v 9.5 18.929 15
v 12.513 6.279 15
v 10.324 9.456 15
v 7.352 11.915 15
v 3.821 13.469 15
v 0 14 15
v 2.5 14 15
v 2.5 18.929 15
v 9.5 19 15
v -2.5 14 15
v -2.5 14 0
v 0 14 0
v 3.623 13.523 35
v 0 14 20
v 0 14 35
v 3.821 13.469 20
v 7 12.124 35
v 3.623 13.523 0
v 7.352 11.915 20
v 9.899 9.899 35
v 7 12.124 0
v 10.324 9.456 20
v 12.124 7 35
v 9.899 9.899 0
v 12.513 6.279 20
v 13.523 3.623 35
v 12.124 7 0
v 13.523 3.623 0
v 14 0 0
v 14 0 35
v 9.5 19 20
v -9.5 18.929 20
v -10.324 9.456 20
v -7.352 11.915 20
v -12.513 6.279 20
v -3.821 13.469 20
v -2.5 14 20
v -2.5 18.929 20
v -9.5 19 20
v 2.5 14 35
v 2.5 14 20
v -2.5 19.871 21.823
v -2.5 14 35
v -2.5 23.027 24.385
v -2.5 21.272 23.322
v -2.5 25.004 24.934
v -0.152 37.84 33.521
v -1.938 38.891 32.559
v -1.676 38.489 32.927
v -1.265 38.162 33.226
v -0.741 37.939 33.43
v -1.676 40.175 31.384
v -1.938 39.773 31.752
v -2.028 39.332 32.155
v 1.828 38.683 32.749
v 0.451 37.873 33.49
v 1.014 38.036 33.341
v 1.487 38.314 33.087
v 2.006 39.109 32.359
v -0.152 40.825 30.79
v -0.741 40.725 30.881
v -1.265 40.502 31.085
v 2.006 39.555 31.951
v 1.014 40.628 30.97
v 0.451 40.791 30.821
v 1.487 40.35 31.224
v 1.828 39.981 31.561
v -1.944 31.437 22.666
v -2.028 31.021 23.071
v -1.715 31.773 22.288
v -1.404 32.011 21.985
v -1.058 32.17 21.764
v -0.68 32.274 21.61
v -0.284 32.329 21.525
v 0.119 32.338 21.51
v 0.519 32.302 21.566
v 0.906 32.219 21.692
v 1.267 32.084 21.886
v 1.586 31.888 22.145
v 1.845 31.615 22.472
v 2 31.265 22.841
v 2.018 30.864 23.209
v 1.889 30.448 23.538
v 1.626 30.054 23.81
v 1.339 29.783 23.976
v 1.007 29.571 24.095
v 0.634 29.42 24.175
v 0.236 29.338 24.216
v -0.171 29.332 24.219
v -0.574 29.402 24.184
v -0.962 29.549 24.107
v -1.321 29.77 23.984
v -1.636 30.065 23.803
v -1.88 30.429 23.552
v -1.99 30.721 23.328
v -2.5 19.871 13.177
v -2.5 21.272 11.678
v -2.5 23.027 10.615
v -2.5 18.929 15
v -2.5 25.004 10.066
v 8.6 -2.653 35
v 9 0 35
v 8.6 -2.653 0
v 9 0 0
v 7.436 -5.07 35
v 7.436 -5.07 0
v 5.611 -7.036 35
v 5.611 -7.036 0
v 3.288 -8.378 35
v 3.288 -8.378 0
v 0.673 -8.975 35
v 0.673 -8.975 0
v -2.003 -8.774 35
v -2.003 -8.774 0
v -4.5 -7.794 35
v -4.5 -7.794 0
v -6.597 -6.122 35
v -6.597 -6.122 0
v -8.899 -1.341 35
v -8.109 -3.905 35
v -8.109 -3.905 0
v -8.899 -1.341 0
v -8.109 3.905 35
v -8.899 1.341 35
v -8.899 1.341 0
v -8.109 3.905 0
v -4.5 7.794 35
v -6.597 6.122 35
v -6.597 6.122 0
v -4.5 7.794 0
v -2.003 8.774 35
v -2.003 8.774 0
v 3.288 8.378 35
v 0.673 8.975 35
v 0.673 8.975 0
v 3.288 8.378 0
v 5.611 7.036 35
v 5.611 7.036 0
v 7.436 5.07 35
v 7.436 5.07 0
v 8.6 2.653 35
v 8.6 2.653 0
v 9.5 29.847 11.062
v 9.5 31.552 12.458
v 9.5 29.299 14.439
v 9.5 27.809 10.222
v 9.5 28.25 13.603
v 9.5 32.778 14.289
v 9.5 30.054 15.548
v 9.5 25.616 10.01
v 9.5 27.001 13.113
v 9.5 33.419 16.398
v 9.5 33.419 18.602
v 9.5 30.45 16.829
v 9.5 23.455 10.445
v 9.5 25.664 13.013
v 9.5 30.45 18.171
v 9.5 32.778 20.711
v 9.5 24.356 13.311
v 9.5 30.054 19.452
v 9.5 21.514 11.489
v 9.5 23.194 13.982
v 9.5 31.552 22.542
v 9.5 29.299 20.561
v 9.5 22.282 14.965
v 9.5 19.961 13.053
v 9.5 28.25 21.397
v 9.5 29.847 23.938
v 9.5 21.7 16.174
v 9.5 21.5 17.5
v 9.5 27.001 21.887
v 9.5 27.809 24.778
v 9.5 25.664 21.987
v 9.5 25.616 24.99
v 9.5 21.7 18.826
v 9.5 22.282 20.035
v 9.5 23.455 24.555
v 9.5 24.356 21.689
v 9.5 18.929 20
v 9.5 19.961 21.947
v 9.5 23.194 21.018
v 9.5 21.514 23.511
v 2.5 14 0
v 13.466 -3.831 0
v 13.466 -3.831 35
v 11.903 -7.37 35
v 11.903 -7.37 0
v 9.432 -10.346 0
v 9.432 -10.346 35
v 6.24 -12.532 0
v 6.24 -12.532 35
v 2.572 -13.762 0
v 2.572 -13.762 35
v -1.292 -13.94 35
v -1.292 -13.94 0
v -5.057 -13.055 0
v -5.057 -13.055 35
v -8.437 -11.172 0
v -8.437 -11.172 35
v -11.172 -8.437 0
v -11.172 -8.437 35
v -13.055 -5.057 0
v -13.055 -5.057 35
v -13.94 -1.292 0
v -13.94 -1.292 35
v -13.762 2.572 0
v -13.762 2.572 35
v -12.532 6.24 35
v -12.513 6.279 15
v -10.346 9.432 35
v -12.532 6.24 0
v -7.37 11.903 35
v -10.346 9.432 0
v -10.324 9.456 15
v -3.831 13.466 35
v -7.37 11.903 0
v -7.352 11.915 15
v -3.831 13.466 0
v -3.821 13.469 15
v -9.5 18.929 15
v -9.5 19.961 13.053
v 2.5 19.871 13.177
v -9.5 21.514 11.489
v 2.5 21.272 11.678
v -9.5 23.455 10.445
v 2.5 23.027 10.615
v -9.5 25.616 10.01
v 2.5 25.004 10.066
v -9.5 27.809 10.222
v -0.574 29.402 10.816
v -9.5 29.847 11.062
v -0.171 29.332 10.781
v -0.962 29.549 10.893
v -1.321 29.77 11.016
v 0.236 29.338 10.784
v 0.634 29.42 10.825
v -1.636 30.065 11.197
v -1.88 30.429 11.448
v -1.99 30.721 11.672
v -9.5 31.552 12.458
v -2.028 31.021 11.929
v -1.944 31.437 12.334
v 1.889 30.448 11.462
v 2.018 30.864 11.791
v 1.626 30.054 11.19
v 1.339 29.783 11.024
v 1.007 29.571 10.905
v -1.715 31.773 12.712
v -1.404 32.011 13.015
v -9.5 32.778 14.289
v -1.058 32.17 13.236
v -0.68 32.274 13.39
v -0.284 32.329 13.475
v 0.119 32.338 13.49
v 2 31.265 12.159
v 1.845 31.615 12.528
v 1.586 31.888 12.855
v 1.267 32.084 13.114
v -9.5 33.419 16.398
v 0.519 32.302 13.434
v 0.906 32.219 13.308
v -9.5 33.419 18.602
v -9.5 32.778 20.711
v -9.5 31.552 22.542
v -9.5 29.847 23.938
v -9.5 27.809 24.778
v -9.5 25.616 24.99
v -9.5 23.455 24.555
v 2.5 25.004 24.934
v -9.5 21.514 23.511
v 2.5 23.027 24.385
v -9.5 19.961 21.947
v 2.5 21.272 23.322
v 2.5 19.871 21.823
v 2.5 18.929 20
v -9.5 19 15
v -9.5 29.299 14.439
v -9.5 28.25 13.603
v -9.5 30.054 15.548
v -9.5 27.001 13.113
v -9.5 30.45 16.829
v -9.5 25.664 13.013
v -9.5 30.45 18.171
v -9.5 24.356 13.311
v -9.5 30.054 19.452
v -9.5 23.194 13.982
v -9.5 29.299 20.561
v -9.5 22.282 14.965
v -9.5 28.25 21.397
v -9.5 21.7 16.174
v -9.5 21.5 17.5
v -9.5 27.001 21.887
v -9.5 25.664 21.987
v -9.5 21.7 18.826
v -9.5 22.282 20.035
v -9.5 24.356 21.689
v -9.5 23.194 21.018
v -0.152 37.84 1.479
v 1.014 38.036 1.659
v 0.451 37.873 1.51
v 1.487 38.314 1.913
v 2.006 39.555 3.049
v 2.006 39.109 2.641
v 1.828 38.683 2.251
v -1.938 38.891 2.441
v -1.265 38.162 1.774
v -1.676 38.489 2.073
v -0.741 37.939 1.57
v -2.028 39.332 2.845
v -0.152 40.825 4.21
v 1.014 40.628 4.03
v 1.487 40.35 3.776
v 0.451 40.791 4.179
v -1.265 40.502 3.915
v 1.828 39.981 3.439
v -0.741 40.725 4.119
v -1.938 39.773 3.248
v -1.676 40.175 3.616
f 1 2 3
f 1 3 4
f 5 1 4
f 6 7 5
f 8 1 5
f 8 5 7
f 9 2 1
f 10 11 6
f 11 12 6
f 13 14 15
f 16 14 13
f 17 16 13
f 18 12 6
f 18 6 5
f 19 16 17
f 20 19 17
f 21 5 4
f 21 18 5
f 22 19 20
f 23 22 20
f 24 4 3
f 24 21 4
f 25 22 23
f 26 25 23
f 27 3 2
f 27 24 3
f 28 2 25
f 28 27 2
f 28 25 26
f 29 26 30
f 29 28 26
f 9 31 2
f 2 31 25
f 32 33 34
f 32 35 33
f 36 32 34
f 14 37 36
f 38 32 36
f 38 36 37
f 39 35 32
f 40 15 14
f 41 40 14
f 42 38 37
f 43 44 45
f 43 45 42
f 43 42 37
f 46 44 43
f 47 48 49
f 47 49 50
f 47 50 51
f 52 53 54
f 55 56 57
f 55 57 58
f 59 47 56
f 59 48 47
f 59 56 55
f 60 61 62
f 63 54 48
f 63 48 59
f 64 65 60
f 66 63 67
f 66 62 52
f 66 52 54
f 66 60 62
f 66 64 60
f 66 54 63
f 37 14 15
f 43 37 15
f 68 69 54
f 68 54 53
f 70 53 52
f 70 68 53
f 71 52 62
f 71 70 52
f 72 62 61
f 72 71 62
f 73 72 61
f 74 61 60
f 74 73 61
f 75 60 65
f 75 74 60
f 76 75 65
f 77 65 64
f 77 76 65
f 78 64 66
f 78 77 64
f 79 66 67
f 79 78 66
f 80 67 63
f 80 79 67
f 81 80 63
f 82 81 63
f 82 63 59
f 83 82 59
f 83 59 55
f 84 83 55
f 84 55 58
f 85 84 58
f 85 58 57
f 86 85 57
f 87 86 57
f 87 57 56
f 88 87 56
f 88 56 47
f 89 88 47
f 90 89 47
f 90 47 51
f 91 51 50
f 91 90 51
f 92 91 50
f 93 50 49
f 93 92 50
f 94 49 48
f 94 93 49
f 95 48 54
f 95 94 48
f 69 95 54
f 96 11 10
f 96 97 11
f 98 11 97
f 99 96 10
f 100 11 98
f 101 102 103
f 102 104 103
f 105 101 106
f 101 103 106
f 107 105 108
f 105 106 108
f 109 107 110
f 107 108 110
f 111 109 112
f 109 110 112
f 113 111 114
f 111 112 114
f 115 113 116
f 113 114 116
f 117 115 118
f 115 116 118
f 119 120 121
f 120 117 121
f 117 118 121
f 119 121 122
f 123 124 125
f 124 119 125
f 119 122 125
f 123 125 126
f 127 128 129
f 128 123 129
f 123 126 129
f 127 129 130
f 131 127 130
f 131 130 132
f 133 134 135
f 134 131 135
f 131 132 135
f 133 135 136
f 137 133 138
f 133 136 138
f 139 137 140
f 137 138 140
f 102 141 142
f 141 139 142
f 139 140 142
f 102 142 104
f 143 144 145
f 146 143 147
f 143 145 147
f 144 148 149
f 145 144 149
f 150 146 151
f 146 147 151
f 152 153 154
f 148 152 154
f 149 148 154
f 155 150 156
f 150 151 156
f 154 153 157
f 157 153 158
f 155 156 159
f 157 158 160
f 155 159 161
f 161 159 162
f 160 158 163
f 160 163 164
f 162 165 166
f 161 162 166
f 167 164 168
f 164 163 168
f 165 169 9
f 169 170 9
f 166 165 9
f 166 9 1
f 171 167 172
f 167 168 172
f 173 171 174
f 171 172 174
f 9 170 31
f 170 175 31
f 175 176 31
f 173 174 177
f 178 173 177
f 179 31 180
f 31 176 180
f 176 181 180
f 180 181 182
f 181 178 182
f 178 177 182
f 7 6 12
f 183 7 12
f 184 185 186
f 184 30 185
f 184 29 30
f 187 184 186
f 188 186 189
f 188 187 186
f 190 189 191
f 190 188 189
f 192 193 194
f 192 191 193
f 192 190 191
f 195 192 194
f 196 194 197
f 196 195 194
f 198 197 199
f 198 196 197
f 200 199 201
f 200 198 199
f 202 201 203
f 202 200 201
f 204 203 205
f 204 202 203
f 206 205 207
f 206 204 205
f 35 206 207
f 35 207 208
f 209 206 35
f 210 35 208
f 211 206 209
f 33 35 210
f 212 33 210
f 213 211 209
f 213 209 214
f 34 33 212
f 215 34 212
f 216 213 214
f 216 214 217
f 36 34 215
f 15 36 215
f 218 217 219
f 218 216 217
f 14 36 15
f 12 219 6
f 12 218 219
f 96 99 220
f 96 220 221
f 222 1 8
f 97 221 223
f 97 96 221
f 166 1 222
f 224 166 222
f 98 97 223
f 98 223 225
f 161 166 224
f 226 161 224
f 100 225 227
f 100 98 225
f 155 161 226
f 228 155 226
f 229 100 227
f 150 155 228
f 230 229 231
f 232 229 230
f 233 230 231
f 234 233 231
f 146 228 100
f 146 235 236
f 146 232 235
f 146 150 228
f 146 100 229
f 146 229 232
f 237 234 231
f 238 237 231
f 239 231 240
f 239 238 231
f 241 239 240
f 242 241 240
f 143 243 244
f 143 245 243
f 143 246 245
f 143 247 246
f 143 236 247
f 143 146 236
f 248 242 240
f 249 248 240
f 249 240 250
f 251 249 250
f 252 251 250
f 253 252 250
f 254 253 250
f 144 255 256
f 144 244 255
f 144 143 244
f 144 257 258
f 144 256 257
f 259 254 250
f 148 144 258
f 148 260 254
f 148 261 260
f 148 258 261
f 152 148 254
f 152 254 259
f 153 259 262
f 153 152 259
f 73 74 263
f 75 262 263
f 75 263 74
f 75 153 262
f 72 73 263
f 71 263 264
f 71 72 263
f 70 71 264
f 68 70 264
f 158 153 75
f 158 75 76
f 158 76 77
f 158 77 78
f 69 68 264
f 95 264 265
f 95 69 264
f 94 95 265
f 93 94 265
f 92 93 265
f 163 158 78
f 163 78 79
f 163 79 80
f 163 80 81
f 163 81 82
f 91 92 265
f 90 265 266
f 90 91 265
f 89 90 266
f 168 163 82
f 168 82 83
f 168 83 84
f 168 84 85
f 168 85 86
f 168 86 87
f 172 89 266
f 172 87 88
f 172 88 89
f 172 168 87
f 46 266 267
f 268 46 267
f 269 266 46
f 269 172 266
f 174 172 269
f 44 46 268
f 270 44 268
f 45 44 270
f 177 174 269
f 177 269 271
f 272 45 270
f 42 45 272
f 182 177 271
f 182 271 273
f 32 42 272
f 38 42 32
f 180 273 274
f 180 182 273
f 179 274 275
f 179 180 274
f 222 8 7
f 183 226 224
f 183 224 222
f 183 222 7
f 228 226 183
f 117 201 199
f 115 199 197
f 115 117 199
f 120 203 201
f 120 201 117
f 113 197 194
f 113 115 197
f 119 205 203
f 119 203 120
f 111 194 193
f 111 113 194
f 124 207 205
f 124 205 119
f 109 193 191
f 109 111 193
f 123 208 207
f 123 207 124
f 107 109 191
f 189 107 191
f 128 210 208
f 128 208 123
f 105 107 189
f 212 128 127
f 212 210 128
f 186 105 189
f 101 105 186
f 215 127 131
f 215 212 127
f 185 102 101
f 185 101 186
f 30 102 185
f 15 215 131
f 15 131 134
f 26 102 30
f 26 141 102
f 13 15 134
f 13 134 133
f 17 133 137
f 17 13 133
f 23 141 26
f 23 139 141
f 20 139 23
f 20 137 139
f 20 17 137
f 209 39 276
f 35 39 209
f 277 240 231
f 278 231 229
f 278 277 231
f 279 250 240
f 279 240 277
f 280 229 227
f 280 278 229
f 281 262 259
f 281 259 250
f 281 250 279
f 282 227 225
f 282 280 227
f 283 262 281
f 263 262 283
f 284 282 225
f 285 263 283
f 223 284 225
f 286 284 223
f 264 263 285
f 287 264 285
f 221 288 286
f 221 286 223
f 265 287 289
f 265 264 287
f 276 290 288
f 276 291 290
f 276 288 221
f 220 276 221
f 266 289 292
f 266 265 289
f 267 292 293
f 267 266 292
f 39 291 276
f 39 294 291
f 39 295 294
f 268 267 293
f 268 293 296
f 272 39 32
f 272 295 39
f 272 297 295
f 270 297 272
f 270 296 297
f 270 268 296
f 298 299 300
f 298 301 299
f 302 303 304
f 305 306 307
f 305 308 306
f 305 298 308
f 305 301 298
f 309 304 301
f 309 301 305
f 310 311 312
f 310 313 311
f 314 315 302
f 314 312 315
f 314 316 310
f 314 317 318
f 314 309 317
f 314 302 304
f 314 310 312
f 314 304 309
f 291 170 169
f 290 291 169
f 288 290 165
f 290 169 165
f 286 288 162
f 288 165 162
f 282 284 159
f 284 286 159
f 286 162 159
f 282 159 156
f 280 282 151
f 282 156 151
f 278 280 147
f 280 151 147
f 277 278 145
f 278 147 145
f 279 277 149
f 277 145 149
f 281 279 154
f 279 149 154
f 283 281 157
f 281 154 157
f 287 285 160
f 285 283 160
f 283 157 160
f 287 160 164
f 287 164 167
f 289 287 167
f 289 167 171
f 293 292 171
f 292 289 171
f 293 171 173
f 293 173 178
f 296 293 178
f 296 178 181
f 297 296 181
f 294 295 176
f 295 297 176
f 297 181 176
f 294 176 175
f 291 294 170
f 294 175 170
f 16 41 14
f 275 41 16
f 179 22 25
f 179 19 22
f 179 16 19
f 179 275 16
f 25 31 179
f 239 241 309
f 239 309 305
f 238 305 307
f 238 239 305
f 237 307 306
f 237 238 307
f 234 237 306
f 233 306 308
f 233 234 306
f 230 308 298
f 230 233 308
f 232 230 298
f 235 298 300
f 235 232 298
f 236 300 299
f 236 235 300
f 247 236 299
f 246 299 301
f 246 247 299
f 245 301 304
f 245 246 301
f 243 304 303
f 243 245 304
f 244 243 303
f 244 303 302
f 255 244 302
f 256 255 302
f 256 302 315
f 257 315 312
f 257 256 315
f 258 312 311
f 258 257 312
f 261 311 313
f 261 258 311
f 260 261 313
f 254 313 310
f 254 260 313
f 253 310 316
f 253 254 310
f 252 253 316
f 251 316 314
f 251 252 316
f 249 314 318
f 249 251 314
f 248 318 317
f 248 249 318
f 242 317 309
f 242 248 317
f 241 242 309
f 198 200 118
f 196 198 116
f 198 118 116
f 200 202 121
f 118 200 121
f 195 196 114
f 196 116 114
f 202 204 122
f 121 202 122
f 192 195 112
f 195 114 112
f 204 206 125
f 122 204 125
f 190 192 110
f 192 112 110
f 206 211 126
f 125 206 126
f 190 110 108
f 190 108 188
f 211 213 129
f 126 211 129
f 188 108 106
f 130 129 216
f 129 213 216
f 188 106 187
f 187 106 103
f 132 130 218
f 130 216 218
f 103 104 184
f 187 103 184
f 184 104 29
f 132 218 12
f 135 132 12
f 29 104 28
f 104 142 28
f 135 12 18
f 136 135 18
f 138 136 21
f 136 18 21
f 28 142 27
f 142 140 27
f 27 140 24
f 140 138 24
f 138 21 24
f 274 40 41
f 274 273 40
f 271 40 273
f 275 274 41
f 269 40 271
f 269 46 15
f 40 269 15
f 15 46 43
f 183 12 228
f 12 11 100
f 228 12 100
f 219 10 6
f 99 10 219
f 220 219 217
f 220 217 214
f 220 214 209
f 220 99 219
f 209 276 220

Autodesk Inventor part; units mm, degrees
ref_plane "YZ Plane" through (0, 0, 0) normal (1, 0, 0) x (0, 1, 0)
ref_plane "XZ Plane" through (0, 0, 0) normal (0, 1, 0) x (-1, 0, 0)
ref_plane "XY Plane" through (0, 0, 0) normal (0, 0, 1) x (1, 0, 0)
sketch "Sketch6" plane through (0, 0, 0) normal (0, 0, 1) x (1, 0, 0)
  circle A0 centre (0, 0) radius 9
  circle A1 centre (0, 0) radius 14
  dimension "d20" = 18
  dimension "d21" = 28
extrude "Extrusion4" add sketch "Sketch6" along normal blind 35
ref_plane "Work Plane2" through (0, 0, 17.5) normal (0, 0, 1) x (1, 0, 0)
sketch "Sketch8" plane through (0, 0, 17.5) normal (0, 0, 1) x (1, 0, 0)
  line L0 (0, 0) -> (0, 26)
  line L1 (0, 26) -> (-9.5, 26)
  line L2 (-9.5, 26) -> (-9.5, 21.5)
  line L3 (-9.5, 21.5) -> (0, 21.5)
  line L4 (0, 21.5) -> (0, 26)
  line L5 (0, 21.5) -> (-9.5, 21.5)
  line L6 (-9.5, 21.5) -> (-9.5, 18.5)
  line L7 (-9.5, 18.5) -> (0, 18.5)
  line L8 (0, 18.5) -> (0, 21.5)
  line L9 (9.5, 21.5) -> (0, 21.5)
  line L10 (9.5, 21.5) -> (9.5, 18.5)
  line L11 (9.5, 18.5) -> (0, 18.5)
  dimension "d28" = 26
  dimension "d29" = 9.5
  dimension "d30" = 4.5
  dimension "d32" = 3
revolve "Revolution1" add sketch "Sketch8" angle 360 about axis through (0, 26, 17.5) along (-1, 0, 0) contours L7 L6 L3 L0 | L0 L9 L10 L11
sketch "Sketch10" plane through (0, 0, 17.5) normal (0, 0, 1) x (1, 0, 0)
  circle A0 centre (0, 0) radius 14 projected
  line L0 (-14, 0) -> (-9.5, 19)
  line L1 (-9.5, 19) -> (0, 19)
  line L2 (-9.5, 33.5) -> (-9.5, 18.5) projected
  line L3 (0, 19) -> (0, 0)
  line L4 (14, 0) -> (9.5, 19)
  line L5 (9.5, 19) -> (0, 19)
  point P0 (-12.5128, 6.2793)
  point P1 (12.5128, 6.2793)
  dimension "d35" = 19
  dimension "d36" = 9.5
extrude "Extrusion6" add sketch "Sketch10" along normal blind 2.5 contours L0 L1 L3 A0 | A0 L3 L5 L4
mirror "Mirror2" about plane through (0, 0, 17.5) normal (0, 0, 1) of "Extrusion6"
ref_plane "Work Plane3" through (0, 59.1111, 15) normal (-1, 0, 0) x (0, 0, 1)
sketch "Sketch11" plane through (0, 59.1111, 15) normal (-1, 0, 0) x (0, 0, 1)
  arc A0 (5, -40.1822) -> (0, -40.1822) centre (2.5, -33.1111) ccw projected
  line L0 (-4.9336, -34.1072) -> (-15, -45.1111)
  line L1 (-15, -45.1111) -> (20, -45.1111) projected
  circle A1 centre (2.5, -33.1111) radius 7.5
  line L2 (2.5, -33.1111) -> (2.5, -59.6944)
  line L3 (10, -34.1161) -> (20, -45.1111)
  point P0 (-15, -59.1111)
  point P1 (10, -33.1111)
  point P2 (2.5, -45.1111)
  point P3 (2.5, -40.6111)
extrude "Extrusion9" add sketch "Sketch11" along normal blind 2.5 contours L2 L1 L0 A0 A1
mirror "Mirror5" about plane through (0, 59.1111, 15) normal (-1, 0, 0) of "Extrusion9"
mirror "Mirror6" about plane through (0, 0, 17.5) normal (0, 0, 1) of "Extrusion9", "Mirror5"
sketch "Sketch13" plane through (2.5, 25.0039, 10.0664) normal (0, 0.675, -0.7378) x (-1, 0, 0)
  line L0 (0, 0) -> (5, 0) projected
  line L1 (0, 0) -> (5, 0)
  line L2 (5, 0) -> (5, 11.3934)
  line L3 (5, 11.3934) -> (0, 11.3934)
  line L4 (0, 11.3934) -> (0, 0)
  line L5 (0, 11.3934) -> (5, 0)
  line L6 (0, 0) -> (5, 11.3934)
  line L7 (2.5, -1.4142) -> (2.5, 8.7105) projected
  circle A0 centre (2.5, 5.6967) radius 2.0284
  point P0 (2.5, -25.2434)
extrude "Extrusion10" add sketch "Sketch13" along normal blind 15 contours A0 L5 L6 | L6 L7 A0 | L7 L5 A0 | A0 L7 L5 | L6 A0 L5 | L7 A0 L6
mirror "Mirror7" about plane through (0, 0, 17.5) normal (0, 0, 1) of "Extrusion10"
